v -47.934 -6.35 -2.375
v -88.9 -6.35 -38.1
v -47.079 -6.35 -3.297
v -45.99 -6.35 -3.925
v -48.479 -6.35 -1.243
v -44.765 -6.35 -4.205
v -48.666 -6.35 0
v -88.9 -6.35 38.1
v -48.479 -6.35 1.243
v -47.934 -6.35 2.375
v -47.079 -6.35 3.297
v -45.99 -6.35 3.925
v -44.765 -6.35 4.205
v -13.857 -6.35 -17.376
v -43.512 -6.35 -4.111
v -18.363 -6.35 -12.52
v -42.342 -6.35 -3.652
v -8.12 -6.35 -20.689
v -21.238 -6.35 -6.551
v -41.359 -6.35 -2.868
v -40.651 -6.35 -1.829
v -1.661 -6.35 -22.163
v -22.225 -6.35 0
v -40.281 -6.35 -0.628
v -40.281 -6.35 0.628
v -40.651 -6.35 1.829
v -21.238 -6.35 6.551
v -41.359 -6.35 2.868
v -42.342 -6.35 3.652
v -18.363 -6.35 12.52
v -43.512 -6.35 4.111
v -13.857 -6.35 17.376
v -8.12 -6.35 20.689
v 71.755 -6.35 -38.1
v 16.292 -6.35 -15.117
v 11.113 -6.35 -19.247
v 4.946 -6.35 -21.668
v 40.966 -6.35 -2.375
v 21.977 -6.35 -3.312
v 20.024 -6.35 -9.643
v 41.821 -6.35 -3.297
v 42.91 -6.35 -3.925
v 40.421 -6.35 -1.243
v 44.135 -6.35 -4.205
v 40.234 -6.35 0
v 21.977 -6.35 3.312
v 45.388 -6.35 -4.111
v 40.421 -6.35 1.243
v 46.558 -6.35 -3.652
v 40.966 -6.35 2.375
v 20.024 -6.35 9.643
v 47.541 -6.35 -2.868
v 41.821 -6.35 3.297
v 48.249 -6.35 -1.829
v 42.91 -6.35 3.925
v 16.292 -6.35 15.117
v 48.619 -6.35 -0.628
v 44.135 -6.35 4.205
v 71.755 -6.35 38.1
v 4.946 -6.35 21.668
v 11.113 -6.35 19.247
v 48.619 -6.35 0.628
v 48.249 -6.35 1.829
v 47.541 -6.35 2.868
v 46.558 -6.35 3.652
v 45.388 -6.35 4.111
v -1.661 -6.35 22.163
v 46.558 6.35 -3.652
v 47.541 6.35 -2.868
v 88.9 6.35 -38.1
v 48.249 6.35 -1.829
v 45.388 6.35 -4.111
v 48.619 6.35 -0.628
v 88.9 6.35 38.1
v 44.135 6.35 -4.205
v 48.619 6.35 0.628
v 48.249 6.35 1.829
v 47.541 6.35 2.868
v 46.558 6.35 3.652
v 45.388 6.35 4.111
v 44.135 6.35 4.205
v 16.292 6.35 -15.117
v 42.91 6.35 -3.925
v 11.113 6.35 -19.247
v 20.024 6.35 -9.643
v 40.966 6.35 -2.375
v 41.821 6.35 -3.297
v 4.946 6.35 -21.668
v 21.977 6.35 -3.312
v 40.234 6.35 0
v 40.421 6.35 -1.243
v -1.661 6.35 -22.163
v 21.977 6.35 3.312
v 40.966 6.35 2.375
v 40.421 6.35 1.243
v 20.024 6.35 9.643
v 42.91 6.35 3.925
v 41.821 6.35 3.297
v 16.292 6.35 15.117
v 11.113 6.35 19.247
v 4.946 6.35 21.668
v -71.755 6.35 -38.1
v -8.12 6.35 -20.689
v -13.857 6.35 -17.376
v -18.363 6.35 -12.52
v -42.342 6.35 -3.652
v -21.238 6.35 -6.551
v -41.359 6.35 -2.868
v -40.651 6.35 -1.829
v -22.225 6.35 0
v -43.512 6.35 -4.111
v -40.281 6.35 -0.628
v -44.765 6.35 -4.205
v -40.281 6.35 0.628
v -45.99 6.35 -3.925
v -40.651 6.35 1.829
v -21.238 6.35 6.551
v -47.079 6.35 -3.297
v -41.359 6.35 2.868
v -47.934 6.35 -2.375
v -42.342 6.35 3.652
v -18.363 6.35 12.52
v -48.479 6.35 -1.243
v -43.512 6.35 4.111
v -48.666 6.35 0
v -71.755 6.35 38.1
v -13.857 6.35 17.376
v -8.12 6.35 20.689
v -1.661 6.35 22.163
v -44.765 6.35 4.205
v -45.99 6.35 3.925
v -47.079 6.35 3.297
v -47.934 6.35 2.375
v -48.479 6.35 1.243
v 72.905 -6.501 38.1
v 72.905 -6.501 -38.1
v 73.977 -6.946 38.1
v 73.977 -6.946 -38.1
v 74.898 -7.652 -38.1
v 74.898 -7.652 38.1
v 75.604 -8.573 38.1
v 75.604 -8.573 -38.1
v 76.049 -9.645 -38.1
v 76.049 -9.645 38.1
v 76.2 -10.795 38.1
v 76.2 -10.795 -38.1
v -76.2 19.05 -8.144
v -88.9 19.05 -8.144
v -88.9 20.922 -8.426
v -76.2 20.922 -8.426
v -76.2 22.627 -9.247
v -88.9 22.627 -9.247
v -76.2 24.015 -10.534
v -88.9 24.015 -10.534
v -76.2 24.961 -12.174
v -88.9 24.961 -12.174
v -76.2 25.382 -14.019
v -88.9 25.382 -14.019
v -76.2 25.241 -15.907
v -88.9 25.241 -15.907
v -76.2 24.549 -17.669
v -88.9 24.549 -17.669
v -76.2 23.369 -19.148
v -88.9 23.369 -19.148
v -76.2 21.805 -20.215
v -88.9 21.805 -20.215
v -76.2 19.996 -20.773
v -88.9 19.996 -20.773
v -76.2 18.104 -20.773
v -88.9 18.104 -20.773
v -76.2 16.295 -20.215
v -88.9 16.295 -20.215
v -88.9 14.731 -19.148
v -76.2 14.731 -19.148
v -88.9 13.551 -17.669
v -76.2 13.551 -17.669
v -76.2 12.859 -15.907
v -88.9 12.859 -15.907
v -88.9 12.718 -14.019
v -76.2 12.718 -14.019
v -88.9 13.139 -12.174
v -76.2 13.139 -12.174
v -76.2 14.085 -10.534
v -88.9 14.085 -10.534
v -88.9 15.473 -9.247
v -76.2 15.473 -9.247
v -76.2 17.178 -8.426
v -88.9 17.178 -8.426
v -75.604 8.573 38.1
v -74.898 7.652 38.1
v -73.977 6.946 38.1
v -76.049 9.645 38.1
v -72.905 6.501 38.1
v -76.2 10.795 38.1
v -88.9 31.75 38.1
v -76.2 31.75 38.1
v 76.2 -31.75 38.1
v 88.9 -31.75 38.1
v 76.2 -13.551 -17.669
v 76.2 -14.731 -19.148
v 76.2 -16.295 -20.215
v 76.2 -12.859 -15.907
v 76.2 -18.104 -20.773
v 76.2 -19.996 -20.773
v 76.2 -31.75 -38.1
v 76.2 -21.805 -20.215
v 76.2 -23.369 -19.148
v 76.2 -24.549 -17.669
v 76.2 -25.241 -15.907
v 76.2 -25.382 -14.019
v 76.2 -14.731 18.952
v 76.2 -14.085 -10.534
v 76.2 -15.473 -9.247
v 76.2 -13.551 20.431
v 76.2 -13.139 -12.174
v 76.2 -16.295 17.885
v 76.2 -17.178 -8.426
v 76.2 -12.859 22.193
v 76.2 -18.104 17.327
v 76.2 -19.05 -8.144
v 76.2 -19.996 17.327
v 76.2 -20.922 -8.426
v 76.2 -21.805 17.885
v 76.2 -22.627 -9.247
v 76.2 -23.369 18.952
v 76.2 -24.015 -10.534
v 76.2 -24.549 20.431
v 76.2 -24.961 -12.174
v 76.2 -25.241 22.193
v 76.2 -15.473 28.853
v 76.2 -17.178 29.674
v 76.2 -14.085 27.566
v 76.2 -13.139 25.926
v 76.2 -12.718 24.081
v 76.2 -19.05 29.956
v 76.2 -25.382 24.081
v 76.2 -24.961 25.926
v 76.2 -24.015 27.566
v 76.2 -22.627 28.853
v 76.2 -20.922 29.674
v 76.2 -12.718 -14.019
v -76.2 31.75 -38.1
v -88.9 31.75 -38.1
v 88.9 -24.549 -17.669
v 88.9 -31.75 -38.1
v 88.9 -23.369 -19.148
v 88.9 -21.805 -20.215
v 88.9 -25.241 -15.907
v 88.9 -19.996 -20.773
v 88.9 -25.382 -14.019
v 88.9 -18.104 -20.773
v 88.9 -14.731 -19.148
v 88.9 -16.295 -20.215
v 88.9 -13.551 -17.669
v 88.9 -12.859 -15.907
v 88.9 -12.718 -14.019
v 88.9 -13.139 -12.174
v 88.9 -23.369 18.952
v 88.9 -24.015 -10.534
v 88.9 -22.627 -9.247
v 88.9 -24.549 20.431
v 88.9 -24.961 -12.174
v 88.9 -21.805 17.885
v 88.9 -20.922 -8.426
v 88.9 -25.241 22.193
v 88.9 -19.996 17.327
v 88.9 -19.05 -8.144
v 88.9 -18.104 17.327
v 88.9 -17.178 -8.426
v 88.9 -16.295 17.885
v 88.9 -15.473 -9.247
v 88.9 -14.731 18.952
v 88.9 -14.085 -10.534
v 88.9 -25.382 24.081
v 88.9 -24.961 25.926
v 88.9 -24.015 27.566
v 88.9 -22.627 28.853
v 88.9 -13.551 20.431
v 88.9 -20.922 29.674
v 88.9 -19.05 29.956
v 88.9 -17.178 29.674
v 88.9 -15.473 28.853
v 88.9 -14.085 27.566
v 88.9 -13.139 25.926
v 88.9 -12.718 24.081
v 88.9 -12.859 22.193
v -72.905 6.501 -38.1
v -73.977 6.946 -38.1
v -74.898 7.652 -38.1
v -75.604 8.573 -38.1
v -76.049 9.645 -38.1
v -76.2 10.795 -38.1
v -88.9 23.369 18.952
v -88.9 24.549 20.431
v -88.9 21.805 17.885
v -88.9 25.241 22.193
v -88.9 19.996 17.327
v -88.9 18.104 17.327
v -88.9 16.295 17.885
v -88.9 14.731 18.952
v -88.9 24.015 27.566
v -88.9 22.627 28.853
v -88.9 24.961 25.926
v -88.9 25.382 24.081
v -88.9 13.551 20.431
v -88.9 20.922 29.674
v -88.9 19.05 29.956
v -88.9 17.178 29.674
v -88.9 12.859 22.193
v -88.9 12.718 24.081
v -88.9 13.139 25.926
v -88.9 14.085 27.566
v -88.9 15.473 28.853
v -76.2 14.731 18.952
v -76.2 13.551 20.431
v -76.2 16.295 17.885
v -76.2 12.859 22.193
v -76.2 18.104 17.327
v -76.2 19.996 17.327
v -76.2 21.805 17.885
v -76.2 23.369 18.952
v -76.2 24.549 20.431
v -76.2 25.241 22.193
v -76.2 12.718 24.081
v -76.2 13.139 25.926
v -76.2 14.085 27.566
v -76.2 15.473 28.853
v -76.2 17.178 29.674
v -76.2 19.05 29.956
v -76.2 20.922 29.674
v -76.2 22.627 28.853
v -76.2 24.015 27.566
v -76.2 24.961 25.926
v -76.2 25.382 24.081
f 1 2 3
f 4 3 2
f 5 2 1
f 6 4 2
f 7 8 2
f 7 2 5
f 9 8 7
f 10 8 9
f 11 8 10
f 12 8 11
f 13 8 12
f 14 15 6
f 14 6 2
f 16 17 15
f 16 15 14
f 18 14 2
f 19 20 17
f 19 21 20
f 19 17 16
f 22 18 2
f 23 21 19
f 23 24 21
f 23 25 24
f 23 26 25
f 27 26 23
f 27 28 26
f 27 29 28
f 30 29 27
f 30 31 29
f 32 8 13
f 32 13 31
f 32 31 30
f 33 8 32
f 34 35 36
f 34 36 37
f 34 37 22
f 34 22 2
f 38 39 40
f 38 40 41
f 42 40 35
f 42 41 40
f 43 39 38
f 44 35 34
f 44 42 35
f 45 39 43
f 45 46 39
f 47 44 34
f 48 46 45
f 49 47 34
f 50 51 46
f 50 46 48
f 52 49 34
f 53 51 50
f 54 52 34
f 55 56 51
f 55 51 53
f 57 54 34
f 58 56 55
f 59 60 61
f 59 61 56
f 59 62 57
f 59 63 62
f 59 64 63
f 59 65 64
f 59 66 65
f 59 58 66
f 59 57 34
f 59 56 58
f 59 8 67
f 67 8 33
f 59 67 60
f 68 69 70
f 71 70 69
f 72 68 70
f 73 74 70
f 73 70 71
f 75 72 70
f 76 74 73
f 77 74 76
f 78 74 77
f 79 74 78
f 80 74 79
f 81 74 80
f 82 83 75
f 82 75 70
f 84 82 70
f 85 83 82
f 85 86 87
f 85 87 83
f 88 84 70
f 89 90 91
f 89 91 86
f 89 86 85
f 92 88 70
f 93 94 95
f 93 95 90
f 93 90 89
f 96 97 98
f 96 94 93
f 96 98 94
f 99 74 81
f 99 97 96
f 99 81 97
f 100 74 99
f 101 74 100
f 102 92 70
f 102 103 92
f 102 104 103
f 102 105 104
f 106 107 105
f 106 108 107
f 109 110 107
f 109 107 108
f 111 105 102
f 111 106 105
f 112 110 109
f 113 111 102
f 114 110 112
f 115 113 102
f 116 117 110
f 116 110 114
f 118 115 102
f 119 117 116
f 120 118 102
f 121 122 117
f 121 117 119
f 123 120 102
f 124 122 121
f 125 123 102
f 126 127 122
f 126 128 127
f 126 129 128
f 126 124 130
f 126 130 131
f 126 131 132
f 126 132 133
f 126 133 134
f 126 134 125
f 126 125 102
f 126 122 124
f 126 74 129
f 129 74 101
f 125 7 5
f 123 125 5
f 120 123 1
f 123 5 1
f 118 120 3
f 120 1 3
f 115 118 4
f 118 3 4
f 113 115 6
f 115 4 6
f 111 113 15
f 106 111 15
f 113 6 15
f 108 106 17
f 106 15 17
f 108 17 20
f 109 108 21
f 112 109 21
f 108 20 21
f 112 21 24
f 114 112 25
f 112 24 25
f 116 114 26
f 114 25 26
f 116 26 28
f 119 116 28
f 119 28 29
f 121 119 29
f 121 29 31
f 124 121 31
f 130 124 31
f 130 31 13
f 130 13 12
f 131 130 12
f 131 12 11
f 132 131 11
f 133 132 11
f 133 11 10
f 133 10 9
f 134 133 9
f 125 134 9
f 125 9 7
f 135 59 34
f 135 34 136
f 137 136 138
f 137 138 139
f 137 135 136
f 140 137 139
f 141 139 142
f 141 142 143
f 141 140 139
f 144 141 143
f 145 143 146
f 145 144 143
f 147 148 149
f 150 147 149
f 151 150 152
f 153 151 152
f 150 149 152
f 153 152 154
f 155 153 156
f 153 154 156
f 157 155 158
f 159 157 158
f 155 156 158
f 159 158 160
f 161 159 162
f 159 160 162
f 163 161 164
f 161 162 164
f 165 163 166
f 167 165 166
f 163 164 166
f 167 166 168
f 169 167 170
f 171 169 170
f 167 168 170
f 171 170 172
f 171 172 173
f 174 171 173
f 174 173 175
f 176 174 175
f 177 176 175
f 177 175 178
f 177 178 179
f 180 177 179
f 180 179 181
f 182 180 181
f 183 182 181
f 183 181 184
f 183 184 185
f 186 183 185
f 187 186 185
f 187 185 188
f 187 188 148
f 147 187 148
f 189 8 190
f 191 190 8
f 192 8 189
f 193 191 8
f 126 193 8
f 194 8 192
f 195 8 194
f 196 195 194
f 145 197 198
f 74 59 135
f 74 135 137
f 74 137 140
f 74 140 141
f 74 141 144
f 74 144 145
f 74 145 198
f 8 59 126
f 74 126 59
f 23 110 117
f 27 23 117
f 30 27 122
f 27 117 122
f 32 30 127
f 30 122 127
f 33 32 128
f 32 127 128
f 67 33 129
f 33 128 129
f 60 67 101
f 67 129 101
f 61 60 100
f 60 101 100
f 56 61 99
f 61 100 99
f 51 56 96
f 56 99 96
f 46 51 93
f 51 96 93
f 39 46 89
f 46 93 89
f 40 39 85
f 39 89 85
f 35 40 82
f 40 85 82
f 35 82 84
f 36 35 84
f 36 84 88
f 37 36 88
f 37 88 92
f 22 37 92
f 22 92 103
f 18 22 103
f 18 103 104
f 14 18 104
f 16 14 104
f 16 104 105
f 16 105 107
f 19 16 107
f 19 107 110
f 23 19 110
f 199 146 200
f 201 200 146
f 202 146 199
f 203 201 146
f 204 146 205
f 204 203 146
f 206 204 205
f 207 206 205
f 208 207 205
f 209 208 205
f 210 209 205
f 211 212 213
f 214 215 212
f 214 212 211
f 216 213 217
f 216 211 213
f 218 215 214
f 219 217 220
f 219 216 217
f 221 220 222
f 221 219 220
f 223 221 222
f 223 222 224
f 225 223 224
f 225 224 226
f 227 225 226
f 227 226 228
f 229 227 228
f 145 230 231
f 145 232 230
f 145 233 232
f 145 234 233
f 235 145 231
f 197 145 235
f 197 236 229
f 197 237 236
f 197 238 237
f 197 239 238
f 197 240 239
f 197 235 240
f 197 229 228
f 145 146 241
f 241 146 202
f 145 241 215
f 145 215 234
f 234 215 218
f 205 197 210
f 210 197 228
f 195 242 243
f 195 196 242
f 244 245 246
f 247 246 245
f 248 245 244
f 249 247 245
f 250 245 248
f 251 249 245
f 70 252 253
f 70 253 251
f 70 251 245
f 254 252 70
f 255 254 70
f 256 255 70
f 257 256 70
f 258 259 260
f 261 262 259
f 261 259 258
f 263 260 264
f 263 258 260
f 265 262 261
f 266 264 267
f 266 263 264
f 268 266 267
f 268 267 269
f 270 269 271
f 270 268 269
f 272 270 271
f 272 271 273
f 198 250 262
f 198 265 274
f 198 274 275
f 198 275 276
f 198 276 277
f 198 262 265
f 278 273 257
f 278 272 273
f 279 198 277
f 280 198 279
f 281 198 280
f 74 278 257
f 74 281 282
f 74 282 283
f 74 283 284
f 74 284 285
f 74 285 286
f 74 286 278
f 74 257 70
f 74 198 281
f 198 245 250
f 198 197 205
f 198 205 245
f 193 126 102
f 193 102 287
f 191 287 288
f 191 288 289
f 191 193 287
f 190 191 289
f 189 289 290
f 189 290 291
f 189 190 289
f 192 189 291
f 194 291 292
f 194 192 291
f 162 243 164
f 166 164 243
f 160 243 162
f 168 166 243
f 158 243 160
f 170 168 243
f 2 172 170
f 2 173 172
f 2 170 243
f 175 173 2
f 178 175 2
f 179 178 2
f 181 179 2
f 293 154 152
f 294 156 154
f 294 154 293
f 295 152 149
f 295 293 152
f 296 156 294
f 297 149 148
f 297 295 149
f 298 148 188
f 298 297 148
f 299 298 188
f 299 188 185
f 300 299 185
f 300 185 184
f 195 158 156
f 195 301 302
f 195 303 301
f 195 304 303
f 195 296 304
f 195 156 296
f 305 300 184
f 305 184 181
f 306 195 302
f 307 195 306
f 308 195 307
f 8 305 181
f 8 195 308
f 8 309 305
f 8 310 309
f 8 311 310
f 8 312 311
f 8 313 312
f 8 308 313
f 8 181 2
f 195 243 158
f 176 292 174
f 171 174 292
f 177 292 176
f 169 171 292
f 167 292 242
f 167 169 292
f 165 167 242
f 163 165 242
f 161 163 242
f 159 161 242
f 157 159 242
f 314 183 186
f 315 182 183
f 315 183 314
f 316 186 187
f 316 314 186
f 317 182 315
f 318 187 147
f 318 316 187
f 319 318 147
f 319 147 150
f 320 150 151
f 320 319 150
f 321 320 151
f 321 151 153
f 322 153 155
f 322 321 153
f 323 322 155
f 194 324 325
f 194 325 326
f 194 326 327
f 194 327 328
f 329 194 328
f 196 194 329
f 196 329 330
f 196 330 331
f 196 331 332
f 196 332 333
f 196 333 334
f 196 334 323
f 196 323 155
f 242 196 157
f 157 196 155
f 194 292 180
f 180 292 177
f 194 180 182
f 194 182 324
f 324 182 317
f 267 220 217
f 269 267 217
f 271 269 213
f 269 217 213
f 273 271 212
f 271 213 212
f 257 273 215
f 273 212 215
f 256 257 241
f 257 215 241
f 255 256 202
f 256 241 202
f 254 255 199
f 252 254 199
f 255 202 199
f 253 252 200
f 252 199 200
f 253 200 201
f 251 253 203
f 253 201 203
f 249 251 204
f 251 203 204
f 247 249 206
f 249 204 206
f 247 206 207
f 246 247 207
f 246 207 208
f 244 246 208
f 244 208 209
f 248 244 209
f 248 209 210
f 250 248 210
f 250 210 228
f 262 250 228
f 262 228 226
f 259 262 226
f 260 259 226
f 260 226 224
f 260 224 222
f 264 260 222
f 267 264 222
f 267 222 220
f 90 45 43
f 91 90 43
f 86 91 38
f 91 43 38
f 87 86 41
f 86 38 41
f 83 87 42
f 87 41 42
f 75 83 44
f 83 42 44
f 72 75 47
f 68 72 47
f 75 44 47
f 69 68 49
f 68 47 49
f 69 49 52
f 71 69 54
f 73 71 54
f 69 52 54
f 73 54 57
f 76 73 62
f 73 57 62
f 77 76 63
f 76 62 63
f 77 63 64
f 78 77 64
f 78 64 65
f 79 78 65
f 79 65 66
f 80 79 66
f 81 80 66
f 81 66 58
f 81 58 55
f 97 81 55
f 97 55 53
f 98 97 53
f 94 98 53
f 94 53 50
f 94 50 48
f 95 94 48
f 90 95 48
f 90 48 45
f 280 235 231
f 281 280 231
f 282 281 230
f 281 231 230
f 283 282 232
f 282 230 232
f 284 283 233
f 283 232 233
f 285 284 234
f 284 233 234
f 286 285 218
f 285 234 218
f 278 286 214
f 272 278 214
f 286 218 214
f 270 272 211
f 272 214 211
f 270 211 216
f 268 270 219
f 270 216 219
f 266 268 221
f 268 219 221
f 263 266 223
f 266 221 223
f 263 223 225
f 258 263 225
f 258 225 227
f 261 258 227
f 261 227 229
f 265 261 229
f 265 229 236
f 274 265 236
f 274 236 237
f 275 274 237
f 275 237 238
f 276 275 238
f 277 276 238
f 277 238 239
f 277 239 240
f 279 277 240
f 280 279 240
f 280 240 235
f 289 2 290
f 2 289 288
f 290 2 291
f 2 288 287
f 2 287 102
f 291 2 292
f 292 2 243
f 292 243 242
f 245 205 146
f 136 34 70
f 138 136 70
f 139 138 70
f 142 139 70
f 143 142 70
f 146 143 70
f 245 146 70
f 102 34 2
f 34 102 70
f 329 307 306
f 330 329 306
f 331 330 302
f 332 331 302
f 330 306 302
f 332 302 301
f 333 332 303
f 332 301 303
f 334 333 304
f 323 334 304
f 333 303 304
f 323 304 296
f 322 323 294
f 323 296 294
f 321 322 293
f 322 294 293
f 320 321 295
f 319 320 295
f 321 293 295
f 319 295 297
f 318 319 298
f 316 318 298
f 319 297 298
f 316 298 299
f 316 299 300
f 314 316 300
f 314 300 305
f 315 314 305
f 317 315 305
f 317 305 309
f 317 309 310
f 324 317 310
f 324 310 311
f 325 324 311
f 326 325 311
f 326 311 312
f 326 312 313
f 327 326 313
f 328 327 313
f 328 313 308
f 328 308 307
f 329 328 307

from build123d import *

# Parameters (mm, degrees)
BOSS_EXTRUDE1_DEPTH        = 38.1
F_1_2_0_5_DIAMETER_HOLE1_D = 12.7
SKETCH4_R                  = 22.225
CUT_EXTRUDE1_DEPTH         = 104.953980203
F_3_8_24_TAPPED_HOLE1_D    = 8.4328


with BuildPart() as part:
    # Sketch1 → Boss-Extrude1 (new, symmetric)
    with BuildSketch(Plane.XY):
        with BuildLine():
            Line((-88.9, 31.75), (-88.9, -6.35))
            Line((-88.9, -6.35), (71.755, -6.35))
            ThreePointArc((71.755, -6.35), (74.898089642, -7.651910358), (76.2, -10.795))
            Line((76.2, -10.795), (76.2, -31.75))
            Line((76.2, -31.75), (88.9, -31.75))
            Line((88.9, -31.75), (88.9, 6.35))
            Line((88.9, 6.35), (-71.755, 6.35))
            ThreePointArc((-71.755, 6.35), (-74.898089642, 7.651910358), (-76.2, 10.795))
            Line((-76.2, 10.795), (-76.2, 31.75))
            Line((-76.2, 31.75), (-88.9, 31.75))
        make_face()
    extrude(amount=BOSS_EXTRUDE1_DEPTH, both=True)

    # 1/2 (0.5) Diameter Hole1 (through all)
    with Locations(Plane(origin=(88.9, 0, 0), x_dir=(0, 0, -1), z_dir=(1, 0, 0))):
        with Locations((-23.606482726, -19.05), (14.493517274, -19.05), (-23.606482726, 19.05), (14.493517274, 19.05)):
            Hole(F_1_2_0_5_DIAMETER_HOLE1_D / 2)

    # Sketch4 → Cut-Extrude1 (cut, through all)
    with BuildSketch(Plane(origin=(0, 6.35, 0), x_dir=(1, 0, 0), z_dir=(0, 1, 0))):
        with Locations(Location((0, 0, 0), (0, 0, 180))):
            Circle(SKETCH4_R)
    extrude(amount=-CUT_EXTRUDE1_DEPTH, mode=Mode.SUBTRACT)

    # 3/8-24 Tapped Hole1 (through all)
    with Locations(Plane(origin=(0, 6.35, 0), x_dir=(1, 0, 0), z_dir=(0, 1, 0))):
        with Locations((44.45, 0), (-44.45, 0)):
            Hole(F_3_8_24_TAPPED_HOLE1_D / 2)


solid = part.part
